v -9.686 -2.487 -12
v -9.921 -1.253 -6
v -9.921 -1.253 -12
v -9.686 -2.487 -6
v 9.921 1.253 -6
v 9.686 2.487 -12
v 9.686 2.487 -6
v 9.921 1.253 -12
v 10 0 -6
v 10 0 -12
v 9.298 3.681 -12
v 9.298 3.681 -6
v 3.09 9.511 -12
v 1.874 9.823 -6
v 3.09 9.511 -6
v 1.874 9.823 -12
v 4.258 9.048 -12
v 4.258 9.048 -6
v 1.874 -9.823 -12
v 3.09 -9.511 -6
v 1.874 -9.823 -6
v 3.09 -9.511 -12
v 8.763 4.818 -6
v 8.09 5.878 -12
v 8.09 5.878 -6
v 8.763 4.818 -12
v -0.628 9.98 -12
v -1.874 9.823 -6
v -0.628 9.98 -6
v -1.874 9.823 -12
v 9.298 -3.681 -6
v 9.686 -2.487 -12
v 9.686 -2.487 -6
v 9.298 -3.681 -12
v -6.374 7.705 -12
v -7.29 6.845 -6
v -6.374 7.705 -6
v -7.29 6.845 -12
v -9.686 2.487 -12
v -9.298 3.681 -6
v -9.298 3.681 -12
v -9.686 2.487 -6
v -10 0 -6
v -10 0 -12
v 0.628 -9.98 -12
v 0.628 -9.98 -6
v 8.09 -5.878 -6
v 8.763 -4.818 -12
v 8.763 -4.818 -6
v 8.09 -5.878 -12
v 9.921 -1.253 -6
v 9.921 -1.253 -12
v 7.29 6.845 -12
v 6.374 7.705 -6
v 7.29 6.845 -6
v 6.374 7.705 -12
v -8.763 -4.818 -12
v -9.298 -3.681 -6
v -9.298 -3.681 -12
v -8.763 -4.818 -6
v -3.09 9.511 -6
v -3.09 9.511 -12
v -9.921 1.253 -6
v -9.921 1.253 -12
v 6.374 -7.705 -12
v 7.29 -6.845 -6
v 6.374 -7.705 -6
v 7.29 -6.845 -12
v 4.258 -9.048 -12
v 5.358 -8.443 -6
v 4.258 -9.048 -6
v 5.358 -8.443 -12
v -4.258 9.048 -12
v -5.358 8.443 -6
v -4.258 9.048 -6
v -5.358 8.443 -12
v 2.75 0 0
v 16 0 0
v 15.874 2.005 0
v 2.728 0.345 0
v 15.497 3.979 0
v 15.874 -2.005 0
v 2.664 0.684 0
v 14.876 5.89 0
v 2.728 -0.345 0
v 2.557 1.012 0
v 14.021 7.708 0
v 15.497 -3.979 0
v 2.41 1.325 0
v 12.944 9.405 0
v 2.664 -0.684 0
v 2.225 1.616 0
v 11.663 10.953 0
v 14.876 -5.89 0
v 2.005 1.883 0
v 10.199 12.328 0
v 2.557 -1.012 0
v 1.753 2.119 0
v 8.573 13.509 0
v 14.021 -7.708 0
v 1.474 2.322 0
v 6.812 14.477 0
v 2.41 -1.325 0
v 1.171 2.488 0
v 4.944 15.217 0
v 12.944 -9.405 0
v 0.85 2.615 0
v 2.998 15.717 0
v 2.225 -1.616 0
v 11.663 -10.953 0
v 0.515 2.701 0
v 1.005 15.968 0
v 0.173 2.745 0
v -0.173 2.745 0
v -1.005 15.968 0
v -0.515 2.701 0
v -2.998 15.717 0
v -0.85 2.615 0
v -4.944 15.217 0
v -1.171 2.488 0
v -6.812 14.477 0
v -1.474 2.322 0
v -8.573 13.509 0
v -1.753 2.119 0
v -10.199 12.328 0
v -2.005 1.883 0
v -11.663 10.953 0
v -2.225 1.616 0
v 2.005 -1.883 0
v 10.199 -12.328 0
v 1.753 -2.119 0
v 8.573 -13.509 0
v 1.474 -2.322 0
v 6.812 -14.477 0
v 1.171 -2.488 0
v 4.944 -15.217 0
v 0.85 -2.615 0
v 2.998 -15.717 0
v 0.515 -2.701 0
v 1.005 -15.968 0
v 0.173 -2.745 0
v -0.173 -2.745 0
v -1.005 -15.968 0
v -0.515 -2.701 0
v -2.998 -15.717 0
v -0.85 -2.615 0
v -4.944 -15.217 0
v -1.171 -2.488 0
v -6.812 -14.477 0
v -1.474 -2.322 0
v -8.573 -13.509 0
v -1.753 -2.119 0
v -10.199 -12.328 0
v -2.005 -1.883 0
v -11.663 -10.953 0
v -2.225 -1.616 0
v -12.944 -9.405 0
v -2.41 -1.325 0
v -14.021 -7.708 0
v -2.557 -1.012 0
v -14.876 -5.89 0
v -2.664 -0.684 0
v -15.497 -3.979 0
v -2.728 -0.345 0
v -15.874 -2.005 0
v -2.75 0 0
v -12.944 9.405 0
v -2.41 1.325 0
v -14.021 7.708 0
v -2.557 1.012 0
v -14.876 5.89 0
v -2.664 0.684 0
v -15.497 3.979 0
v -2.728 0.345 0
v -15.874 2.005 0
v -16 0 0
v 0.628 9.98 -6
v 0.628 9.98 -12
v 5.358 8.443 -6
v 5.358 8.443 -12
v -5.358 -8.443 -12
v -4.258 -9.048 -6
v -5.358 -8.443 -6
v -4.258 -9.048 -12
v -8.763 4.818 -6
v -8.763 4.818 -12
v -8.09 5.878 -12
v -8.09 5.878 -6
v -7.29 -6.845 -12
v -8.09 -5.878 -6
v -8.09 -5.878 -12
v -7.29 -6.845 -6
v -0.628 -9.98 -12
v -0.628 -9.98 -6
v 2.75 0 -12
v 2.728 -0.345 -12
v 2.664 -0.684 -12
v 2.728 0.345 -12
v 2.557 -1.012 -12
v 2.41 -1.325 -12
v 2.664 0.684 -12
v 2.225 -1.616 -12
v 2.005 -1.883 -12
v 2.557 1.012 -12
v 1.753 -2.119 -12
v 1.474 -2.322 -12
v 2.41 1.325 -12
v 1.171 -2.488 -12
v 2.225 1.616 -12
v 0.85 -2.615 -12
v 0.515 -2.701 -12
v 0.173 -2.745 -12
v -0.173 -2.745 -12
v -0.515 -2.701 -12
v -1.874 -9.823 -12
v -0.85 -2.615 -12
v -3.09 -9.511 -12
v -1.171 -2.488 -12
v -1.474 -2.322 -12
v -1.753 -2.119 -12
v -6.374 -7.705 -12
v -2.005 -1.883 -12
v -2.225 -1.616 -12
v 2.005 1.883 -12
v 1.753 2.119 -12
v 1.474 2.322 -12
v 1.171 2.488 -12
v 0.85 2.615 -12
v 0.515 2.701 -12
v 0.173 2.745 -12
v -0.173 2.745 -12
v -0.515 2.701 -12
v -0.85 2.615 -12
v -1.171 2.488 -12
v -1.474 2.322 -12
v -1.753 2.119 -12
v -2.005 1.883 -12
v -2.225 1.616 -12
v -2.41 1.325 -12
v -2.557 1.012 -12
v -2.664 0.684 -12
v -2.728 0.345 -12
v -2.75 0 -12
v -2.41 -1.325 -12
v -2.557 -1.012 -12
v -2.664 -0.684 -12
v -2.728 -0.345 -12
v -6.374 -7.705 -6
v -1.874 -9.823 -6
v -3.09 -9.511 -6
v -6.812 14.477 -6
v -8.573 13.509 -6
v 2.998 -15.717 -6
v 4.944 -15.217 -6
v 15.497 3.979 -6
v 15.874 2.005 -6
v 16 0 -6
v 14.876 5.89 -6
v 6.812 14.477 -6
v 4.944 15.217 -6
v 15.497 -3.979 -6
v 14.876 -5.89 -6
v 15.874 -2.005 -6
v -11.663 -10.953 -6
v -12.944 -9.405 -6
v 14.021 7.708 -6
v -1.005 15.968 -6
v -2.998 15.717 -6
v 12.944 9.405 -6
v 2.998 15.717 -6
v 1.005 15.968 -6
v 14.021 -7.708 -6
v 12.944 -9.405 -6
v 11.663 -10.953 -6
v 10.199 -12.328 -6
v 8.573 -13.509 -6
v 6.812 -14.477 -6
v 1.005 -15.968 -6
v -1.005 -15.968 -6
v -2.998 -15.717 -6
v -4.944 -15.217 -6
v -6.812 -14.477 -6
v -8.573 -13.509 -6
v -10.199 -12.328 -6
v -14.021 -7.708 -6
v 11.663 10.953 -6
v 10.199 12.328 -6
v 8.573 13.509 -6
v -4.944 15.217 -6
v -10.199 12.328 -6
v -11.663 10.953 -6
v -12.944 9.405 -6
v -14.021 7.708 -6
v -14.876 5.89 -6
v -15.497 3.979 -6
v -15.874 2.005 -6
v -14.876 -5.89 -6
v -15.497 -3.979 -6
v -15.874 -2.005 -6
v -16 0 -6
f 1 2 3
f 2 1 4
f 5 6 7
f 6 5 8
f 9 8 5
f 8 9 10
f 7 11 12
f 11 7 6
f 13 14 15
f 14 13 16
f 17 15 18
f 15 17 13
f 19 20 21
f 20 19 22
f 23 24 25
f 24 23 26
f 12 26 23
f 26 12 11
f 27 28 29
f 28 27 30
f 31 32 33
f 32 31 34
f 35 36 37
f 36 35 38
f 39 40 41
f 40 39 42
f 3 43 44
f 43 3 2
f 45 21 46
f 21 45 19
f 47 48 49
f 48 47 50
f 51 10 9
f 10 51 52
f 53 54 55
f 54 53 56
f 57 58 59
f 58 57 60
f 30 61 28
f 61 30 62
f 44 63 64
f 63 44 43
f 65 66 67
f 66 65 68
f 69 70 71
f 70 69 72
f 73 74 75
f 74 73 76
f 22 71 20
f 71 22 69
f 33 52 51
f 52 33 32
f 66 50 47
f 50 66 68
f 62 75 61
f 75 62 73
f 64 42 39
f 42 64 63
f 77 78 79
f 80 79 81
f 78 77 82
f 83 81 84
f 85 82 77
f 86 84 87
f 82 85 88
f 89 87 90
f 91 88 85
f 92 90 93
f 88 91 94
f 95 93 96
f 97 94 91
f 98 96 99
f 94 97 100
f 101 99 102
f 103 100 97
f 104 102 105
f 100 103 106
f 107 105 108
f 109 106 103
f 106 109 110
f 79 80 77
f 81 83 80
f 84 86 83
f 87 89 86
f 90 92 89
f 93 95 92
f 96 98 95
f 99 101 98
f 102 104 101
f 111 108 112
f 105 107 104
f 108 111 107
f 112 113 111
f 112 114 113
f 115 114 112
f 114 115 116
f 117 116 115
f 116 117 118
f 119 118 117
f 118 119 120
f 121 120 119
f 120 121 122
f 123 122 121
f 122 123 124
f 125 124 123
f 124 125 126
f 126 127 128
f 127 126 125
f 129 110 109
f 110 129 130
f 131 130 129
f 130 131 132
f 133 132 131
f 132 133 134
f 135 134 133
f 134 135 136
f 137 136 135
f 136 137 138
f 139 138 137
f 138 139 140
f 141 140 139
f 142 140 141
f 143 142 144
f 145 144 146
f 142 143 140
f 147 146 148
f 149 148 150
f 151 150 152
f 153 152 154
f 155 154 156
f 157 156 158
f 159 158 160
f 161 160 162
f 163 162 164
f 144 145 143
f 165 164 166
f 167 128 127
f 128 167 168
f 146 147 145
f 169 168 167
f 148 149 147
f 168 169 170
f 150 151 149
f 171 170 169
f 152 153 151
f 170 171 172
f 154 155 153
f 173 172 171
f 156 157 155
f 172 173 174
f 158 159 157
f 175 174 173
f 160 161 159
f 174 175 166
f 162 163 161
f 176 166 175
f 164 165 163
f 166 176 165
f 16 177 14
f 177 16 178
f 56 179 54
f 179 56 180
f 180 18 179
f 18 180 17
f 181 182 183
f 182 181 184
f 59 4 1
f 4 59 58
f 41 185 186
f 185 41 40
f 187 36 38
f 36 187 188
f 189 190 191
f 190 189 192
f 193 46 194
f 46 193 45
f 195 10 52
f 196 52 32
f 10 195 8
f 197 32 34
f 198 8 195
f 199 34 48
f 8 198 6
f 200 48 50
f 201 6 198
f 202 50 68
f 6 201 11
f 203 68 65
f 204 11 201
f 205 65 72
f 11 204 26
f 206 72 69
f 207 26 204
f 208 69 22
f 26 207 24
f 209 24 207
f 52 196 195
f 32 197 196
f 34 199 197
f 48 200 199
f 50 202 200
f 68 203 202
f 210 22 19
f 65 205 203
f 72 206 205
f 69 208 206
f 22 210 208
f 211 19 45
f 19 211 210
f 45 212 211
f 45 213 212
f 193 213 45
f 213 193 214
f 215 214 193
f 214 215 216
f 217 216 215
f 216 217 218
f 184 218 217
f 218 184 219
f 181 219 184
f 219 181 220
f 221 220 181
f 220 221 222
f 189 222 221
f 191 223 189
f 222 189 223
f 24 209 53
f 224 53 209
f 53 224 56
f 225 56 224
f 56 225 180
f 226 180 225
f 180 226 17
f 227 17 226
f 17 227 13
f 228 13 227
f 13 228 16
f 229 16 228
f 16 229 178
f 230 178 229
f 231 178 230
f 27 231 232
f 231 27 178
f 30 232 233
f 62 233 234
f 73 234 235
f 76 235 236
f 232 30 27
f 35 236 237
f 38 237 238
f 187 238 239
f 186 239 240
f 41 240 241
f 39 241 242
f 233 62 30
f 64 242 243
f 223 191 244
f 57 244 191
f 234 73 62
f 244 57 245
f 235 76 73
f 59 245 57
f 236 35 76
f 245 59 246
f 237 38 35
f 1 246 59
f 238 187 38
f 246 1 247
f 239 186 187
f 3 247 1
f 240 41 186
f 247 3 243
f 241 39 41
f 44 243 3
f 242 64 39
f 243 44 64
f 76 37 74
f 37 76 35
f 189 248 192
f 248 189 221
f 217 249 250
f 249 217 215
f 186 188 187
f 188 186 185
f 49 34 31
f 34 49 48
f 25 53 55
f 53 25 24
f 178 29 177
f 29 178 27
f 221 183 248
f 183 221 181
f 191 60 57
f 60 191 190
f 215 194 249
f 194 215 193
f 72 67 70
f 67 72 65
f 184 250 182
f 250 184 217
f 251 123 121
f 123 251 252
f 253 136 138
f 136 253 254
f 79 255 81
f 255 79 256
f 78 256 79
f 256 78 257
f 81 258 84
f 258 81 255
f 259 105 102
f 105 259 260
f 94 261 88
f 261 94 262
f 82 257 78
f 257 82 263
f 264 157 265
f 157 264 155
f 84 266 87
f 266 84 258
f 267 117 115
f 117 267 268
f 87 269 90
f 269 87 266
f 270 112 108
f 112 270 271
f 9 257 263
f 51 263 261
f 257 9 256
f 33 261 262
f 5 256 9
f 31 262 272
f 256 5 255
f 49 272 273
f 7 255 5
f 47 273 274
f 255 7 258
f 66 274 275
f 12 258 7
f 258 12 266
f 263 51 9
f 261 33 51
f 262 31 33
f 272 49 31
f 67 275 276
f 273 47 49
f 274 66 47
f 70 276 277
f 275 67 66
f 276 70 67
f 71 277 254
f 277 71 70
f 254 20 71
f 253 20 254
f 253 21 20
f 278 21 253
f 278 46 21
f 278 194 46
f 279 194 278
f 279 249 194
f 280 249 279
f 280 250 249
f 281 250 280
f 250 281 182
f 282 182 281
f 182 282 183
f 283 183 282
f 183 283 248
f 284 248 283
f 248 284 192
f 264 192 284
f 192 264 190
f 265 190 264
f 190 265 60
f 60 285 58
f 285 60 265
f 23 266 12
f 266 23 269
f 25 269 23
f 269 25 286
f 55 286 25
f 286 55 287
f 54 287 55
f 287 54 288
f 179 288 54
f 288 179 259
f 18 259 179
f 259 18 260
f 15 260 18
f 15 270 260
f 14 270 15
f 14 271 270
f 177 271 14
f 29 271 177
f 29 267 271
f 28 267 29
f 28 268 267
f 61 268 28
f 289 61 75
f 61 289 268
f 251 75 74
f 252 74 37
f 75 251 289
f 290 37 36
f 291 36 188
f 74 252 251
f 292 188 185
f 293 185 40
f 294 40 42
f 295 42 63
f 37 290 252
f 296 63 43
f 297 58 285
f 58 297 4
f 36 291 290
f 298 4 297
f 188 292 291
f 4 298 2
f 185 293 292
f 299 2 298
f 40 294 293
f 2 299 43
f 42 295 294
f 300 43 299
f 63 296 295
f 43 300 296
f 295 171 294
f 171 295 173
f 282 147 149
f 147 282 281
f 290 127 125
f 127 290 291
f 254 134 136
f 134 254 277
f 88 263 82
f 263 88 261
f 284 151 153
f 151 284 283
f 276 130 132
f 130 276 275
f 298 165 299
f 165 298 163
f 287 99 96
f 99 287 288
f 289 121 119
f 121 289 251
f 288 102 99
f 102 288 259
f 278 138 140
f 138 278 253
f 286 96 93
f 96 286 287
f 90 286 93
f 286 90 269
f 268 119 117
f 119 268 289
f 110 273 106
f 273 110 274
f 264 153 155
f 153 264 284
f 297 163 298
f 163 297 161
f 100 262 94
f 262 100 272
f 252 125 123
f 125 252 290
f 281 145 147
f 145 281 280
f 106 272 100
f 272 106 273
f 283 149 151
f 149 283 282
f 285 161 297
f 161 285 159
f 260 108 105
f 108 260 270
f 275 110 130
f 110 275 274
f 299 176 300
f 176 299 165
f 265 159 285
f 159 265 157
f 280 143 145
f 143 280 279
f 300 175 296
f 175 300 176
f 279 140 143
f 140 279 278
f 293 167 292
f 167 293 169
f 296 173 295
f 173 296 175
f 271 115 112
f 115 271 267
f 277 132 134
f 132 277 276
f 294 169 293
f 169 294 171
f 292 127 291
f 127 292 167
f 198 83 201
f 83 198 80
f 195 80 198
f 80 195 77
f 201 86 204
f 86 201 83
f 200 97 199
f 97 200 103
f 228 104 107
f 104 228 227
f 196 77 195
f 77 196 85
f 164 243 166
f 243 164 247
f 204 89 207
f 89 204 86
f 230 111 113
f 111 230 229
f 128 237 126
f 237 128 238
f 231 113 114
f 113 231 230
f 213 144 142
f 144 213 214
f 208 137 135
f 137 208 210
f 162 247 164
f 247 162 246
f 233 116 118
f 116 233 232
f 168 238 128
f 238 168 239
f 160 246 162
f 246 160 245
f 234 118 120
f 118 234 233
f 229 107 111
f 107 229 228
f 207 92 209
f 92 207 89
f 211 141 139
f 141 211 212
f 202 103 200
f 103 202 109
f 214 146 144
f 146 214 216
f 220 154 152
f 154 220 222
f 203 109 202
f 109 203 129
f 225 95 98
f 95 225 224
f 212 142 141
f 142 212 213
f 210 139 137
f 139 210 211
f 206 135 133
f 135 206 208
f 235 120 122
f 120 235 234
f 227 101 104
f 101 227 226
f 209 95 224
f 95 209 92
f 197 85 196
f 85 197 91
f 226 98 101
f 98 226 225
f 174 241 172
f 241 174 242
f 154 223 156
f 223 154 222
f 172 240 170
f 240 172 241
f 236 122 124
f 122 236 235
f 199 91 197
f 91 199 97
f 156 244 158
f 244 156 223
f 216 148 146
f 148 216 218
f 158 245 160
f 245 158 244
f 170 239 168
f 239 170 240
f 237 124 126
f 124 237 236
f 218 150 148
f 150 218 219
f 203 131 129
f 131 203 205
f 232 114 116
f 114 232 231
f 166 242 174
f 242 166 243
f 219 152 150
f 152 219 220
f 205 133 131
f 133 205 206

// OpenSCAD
$fn = 50;


difference() {
	union() {
		translate(v = [0, 0, -12.0000000000]) {
			cylinder(h = 12, r = 10.0000000000);
		}
		translate(v = [0, 0, -6.0000000000]) {
			cylinder(h = 6, r = 16.0000000000);
		}
	}
	union() {
		#translate(v = [0, 0, -12]) {
			cylinder(h = 12, r = 2.7500000000);
		}
	}
}
